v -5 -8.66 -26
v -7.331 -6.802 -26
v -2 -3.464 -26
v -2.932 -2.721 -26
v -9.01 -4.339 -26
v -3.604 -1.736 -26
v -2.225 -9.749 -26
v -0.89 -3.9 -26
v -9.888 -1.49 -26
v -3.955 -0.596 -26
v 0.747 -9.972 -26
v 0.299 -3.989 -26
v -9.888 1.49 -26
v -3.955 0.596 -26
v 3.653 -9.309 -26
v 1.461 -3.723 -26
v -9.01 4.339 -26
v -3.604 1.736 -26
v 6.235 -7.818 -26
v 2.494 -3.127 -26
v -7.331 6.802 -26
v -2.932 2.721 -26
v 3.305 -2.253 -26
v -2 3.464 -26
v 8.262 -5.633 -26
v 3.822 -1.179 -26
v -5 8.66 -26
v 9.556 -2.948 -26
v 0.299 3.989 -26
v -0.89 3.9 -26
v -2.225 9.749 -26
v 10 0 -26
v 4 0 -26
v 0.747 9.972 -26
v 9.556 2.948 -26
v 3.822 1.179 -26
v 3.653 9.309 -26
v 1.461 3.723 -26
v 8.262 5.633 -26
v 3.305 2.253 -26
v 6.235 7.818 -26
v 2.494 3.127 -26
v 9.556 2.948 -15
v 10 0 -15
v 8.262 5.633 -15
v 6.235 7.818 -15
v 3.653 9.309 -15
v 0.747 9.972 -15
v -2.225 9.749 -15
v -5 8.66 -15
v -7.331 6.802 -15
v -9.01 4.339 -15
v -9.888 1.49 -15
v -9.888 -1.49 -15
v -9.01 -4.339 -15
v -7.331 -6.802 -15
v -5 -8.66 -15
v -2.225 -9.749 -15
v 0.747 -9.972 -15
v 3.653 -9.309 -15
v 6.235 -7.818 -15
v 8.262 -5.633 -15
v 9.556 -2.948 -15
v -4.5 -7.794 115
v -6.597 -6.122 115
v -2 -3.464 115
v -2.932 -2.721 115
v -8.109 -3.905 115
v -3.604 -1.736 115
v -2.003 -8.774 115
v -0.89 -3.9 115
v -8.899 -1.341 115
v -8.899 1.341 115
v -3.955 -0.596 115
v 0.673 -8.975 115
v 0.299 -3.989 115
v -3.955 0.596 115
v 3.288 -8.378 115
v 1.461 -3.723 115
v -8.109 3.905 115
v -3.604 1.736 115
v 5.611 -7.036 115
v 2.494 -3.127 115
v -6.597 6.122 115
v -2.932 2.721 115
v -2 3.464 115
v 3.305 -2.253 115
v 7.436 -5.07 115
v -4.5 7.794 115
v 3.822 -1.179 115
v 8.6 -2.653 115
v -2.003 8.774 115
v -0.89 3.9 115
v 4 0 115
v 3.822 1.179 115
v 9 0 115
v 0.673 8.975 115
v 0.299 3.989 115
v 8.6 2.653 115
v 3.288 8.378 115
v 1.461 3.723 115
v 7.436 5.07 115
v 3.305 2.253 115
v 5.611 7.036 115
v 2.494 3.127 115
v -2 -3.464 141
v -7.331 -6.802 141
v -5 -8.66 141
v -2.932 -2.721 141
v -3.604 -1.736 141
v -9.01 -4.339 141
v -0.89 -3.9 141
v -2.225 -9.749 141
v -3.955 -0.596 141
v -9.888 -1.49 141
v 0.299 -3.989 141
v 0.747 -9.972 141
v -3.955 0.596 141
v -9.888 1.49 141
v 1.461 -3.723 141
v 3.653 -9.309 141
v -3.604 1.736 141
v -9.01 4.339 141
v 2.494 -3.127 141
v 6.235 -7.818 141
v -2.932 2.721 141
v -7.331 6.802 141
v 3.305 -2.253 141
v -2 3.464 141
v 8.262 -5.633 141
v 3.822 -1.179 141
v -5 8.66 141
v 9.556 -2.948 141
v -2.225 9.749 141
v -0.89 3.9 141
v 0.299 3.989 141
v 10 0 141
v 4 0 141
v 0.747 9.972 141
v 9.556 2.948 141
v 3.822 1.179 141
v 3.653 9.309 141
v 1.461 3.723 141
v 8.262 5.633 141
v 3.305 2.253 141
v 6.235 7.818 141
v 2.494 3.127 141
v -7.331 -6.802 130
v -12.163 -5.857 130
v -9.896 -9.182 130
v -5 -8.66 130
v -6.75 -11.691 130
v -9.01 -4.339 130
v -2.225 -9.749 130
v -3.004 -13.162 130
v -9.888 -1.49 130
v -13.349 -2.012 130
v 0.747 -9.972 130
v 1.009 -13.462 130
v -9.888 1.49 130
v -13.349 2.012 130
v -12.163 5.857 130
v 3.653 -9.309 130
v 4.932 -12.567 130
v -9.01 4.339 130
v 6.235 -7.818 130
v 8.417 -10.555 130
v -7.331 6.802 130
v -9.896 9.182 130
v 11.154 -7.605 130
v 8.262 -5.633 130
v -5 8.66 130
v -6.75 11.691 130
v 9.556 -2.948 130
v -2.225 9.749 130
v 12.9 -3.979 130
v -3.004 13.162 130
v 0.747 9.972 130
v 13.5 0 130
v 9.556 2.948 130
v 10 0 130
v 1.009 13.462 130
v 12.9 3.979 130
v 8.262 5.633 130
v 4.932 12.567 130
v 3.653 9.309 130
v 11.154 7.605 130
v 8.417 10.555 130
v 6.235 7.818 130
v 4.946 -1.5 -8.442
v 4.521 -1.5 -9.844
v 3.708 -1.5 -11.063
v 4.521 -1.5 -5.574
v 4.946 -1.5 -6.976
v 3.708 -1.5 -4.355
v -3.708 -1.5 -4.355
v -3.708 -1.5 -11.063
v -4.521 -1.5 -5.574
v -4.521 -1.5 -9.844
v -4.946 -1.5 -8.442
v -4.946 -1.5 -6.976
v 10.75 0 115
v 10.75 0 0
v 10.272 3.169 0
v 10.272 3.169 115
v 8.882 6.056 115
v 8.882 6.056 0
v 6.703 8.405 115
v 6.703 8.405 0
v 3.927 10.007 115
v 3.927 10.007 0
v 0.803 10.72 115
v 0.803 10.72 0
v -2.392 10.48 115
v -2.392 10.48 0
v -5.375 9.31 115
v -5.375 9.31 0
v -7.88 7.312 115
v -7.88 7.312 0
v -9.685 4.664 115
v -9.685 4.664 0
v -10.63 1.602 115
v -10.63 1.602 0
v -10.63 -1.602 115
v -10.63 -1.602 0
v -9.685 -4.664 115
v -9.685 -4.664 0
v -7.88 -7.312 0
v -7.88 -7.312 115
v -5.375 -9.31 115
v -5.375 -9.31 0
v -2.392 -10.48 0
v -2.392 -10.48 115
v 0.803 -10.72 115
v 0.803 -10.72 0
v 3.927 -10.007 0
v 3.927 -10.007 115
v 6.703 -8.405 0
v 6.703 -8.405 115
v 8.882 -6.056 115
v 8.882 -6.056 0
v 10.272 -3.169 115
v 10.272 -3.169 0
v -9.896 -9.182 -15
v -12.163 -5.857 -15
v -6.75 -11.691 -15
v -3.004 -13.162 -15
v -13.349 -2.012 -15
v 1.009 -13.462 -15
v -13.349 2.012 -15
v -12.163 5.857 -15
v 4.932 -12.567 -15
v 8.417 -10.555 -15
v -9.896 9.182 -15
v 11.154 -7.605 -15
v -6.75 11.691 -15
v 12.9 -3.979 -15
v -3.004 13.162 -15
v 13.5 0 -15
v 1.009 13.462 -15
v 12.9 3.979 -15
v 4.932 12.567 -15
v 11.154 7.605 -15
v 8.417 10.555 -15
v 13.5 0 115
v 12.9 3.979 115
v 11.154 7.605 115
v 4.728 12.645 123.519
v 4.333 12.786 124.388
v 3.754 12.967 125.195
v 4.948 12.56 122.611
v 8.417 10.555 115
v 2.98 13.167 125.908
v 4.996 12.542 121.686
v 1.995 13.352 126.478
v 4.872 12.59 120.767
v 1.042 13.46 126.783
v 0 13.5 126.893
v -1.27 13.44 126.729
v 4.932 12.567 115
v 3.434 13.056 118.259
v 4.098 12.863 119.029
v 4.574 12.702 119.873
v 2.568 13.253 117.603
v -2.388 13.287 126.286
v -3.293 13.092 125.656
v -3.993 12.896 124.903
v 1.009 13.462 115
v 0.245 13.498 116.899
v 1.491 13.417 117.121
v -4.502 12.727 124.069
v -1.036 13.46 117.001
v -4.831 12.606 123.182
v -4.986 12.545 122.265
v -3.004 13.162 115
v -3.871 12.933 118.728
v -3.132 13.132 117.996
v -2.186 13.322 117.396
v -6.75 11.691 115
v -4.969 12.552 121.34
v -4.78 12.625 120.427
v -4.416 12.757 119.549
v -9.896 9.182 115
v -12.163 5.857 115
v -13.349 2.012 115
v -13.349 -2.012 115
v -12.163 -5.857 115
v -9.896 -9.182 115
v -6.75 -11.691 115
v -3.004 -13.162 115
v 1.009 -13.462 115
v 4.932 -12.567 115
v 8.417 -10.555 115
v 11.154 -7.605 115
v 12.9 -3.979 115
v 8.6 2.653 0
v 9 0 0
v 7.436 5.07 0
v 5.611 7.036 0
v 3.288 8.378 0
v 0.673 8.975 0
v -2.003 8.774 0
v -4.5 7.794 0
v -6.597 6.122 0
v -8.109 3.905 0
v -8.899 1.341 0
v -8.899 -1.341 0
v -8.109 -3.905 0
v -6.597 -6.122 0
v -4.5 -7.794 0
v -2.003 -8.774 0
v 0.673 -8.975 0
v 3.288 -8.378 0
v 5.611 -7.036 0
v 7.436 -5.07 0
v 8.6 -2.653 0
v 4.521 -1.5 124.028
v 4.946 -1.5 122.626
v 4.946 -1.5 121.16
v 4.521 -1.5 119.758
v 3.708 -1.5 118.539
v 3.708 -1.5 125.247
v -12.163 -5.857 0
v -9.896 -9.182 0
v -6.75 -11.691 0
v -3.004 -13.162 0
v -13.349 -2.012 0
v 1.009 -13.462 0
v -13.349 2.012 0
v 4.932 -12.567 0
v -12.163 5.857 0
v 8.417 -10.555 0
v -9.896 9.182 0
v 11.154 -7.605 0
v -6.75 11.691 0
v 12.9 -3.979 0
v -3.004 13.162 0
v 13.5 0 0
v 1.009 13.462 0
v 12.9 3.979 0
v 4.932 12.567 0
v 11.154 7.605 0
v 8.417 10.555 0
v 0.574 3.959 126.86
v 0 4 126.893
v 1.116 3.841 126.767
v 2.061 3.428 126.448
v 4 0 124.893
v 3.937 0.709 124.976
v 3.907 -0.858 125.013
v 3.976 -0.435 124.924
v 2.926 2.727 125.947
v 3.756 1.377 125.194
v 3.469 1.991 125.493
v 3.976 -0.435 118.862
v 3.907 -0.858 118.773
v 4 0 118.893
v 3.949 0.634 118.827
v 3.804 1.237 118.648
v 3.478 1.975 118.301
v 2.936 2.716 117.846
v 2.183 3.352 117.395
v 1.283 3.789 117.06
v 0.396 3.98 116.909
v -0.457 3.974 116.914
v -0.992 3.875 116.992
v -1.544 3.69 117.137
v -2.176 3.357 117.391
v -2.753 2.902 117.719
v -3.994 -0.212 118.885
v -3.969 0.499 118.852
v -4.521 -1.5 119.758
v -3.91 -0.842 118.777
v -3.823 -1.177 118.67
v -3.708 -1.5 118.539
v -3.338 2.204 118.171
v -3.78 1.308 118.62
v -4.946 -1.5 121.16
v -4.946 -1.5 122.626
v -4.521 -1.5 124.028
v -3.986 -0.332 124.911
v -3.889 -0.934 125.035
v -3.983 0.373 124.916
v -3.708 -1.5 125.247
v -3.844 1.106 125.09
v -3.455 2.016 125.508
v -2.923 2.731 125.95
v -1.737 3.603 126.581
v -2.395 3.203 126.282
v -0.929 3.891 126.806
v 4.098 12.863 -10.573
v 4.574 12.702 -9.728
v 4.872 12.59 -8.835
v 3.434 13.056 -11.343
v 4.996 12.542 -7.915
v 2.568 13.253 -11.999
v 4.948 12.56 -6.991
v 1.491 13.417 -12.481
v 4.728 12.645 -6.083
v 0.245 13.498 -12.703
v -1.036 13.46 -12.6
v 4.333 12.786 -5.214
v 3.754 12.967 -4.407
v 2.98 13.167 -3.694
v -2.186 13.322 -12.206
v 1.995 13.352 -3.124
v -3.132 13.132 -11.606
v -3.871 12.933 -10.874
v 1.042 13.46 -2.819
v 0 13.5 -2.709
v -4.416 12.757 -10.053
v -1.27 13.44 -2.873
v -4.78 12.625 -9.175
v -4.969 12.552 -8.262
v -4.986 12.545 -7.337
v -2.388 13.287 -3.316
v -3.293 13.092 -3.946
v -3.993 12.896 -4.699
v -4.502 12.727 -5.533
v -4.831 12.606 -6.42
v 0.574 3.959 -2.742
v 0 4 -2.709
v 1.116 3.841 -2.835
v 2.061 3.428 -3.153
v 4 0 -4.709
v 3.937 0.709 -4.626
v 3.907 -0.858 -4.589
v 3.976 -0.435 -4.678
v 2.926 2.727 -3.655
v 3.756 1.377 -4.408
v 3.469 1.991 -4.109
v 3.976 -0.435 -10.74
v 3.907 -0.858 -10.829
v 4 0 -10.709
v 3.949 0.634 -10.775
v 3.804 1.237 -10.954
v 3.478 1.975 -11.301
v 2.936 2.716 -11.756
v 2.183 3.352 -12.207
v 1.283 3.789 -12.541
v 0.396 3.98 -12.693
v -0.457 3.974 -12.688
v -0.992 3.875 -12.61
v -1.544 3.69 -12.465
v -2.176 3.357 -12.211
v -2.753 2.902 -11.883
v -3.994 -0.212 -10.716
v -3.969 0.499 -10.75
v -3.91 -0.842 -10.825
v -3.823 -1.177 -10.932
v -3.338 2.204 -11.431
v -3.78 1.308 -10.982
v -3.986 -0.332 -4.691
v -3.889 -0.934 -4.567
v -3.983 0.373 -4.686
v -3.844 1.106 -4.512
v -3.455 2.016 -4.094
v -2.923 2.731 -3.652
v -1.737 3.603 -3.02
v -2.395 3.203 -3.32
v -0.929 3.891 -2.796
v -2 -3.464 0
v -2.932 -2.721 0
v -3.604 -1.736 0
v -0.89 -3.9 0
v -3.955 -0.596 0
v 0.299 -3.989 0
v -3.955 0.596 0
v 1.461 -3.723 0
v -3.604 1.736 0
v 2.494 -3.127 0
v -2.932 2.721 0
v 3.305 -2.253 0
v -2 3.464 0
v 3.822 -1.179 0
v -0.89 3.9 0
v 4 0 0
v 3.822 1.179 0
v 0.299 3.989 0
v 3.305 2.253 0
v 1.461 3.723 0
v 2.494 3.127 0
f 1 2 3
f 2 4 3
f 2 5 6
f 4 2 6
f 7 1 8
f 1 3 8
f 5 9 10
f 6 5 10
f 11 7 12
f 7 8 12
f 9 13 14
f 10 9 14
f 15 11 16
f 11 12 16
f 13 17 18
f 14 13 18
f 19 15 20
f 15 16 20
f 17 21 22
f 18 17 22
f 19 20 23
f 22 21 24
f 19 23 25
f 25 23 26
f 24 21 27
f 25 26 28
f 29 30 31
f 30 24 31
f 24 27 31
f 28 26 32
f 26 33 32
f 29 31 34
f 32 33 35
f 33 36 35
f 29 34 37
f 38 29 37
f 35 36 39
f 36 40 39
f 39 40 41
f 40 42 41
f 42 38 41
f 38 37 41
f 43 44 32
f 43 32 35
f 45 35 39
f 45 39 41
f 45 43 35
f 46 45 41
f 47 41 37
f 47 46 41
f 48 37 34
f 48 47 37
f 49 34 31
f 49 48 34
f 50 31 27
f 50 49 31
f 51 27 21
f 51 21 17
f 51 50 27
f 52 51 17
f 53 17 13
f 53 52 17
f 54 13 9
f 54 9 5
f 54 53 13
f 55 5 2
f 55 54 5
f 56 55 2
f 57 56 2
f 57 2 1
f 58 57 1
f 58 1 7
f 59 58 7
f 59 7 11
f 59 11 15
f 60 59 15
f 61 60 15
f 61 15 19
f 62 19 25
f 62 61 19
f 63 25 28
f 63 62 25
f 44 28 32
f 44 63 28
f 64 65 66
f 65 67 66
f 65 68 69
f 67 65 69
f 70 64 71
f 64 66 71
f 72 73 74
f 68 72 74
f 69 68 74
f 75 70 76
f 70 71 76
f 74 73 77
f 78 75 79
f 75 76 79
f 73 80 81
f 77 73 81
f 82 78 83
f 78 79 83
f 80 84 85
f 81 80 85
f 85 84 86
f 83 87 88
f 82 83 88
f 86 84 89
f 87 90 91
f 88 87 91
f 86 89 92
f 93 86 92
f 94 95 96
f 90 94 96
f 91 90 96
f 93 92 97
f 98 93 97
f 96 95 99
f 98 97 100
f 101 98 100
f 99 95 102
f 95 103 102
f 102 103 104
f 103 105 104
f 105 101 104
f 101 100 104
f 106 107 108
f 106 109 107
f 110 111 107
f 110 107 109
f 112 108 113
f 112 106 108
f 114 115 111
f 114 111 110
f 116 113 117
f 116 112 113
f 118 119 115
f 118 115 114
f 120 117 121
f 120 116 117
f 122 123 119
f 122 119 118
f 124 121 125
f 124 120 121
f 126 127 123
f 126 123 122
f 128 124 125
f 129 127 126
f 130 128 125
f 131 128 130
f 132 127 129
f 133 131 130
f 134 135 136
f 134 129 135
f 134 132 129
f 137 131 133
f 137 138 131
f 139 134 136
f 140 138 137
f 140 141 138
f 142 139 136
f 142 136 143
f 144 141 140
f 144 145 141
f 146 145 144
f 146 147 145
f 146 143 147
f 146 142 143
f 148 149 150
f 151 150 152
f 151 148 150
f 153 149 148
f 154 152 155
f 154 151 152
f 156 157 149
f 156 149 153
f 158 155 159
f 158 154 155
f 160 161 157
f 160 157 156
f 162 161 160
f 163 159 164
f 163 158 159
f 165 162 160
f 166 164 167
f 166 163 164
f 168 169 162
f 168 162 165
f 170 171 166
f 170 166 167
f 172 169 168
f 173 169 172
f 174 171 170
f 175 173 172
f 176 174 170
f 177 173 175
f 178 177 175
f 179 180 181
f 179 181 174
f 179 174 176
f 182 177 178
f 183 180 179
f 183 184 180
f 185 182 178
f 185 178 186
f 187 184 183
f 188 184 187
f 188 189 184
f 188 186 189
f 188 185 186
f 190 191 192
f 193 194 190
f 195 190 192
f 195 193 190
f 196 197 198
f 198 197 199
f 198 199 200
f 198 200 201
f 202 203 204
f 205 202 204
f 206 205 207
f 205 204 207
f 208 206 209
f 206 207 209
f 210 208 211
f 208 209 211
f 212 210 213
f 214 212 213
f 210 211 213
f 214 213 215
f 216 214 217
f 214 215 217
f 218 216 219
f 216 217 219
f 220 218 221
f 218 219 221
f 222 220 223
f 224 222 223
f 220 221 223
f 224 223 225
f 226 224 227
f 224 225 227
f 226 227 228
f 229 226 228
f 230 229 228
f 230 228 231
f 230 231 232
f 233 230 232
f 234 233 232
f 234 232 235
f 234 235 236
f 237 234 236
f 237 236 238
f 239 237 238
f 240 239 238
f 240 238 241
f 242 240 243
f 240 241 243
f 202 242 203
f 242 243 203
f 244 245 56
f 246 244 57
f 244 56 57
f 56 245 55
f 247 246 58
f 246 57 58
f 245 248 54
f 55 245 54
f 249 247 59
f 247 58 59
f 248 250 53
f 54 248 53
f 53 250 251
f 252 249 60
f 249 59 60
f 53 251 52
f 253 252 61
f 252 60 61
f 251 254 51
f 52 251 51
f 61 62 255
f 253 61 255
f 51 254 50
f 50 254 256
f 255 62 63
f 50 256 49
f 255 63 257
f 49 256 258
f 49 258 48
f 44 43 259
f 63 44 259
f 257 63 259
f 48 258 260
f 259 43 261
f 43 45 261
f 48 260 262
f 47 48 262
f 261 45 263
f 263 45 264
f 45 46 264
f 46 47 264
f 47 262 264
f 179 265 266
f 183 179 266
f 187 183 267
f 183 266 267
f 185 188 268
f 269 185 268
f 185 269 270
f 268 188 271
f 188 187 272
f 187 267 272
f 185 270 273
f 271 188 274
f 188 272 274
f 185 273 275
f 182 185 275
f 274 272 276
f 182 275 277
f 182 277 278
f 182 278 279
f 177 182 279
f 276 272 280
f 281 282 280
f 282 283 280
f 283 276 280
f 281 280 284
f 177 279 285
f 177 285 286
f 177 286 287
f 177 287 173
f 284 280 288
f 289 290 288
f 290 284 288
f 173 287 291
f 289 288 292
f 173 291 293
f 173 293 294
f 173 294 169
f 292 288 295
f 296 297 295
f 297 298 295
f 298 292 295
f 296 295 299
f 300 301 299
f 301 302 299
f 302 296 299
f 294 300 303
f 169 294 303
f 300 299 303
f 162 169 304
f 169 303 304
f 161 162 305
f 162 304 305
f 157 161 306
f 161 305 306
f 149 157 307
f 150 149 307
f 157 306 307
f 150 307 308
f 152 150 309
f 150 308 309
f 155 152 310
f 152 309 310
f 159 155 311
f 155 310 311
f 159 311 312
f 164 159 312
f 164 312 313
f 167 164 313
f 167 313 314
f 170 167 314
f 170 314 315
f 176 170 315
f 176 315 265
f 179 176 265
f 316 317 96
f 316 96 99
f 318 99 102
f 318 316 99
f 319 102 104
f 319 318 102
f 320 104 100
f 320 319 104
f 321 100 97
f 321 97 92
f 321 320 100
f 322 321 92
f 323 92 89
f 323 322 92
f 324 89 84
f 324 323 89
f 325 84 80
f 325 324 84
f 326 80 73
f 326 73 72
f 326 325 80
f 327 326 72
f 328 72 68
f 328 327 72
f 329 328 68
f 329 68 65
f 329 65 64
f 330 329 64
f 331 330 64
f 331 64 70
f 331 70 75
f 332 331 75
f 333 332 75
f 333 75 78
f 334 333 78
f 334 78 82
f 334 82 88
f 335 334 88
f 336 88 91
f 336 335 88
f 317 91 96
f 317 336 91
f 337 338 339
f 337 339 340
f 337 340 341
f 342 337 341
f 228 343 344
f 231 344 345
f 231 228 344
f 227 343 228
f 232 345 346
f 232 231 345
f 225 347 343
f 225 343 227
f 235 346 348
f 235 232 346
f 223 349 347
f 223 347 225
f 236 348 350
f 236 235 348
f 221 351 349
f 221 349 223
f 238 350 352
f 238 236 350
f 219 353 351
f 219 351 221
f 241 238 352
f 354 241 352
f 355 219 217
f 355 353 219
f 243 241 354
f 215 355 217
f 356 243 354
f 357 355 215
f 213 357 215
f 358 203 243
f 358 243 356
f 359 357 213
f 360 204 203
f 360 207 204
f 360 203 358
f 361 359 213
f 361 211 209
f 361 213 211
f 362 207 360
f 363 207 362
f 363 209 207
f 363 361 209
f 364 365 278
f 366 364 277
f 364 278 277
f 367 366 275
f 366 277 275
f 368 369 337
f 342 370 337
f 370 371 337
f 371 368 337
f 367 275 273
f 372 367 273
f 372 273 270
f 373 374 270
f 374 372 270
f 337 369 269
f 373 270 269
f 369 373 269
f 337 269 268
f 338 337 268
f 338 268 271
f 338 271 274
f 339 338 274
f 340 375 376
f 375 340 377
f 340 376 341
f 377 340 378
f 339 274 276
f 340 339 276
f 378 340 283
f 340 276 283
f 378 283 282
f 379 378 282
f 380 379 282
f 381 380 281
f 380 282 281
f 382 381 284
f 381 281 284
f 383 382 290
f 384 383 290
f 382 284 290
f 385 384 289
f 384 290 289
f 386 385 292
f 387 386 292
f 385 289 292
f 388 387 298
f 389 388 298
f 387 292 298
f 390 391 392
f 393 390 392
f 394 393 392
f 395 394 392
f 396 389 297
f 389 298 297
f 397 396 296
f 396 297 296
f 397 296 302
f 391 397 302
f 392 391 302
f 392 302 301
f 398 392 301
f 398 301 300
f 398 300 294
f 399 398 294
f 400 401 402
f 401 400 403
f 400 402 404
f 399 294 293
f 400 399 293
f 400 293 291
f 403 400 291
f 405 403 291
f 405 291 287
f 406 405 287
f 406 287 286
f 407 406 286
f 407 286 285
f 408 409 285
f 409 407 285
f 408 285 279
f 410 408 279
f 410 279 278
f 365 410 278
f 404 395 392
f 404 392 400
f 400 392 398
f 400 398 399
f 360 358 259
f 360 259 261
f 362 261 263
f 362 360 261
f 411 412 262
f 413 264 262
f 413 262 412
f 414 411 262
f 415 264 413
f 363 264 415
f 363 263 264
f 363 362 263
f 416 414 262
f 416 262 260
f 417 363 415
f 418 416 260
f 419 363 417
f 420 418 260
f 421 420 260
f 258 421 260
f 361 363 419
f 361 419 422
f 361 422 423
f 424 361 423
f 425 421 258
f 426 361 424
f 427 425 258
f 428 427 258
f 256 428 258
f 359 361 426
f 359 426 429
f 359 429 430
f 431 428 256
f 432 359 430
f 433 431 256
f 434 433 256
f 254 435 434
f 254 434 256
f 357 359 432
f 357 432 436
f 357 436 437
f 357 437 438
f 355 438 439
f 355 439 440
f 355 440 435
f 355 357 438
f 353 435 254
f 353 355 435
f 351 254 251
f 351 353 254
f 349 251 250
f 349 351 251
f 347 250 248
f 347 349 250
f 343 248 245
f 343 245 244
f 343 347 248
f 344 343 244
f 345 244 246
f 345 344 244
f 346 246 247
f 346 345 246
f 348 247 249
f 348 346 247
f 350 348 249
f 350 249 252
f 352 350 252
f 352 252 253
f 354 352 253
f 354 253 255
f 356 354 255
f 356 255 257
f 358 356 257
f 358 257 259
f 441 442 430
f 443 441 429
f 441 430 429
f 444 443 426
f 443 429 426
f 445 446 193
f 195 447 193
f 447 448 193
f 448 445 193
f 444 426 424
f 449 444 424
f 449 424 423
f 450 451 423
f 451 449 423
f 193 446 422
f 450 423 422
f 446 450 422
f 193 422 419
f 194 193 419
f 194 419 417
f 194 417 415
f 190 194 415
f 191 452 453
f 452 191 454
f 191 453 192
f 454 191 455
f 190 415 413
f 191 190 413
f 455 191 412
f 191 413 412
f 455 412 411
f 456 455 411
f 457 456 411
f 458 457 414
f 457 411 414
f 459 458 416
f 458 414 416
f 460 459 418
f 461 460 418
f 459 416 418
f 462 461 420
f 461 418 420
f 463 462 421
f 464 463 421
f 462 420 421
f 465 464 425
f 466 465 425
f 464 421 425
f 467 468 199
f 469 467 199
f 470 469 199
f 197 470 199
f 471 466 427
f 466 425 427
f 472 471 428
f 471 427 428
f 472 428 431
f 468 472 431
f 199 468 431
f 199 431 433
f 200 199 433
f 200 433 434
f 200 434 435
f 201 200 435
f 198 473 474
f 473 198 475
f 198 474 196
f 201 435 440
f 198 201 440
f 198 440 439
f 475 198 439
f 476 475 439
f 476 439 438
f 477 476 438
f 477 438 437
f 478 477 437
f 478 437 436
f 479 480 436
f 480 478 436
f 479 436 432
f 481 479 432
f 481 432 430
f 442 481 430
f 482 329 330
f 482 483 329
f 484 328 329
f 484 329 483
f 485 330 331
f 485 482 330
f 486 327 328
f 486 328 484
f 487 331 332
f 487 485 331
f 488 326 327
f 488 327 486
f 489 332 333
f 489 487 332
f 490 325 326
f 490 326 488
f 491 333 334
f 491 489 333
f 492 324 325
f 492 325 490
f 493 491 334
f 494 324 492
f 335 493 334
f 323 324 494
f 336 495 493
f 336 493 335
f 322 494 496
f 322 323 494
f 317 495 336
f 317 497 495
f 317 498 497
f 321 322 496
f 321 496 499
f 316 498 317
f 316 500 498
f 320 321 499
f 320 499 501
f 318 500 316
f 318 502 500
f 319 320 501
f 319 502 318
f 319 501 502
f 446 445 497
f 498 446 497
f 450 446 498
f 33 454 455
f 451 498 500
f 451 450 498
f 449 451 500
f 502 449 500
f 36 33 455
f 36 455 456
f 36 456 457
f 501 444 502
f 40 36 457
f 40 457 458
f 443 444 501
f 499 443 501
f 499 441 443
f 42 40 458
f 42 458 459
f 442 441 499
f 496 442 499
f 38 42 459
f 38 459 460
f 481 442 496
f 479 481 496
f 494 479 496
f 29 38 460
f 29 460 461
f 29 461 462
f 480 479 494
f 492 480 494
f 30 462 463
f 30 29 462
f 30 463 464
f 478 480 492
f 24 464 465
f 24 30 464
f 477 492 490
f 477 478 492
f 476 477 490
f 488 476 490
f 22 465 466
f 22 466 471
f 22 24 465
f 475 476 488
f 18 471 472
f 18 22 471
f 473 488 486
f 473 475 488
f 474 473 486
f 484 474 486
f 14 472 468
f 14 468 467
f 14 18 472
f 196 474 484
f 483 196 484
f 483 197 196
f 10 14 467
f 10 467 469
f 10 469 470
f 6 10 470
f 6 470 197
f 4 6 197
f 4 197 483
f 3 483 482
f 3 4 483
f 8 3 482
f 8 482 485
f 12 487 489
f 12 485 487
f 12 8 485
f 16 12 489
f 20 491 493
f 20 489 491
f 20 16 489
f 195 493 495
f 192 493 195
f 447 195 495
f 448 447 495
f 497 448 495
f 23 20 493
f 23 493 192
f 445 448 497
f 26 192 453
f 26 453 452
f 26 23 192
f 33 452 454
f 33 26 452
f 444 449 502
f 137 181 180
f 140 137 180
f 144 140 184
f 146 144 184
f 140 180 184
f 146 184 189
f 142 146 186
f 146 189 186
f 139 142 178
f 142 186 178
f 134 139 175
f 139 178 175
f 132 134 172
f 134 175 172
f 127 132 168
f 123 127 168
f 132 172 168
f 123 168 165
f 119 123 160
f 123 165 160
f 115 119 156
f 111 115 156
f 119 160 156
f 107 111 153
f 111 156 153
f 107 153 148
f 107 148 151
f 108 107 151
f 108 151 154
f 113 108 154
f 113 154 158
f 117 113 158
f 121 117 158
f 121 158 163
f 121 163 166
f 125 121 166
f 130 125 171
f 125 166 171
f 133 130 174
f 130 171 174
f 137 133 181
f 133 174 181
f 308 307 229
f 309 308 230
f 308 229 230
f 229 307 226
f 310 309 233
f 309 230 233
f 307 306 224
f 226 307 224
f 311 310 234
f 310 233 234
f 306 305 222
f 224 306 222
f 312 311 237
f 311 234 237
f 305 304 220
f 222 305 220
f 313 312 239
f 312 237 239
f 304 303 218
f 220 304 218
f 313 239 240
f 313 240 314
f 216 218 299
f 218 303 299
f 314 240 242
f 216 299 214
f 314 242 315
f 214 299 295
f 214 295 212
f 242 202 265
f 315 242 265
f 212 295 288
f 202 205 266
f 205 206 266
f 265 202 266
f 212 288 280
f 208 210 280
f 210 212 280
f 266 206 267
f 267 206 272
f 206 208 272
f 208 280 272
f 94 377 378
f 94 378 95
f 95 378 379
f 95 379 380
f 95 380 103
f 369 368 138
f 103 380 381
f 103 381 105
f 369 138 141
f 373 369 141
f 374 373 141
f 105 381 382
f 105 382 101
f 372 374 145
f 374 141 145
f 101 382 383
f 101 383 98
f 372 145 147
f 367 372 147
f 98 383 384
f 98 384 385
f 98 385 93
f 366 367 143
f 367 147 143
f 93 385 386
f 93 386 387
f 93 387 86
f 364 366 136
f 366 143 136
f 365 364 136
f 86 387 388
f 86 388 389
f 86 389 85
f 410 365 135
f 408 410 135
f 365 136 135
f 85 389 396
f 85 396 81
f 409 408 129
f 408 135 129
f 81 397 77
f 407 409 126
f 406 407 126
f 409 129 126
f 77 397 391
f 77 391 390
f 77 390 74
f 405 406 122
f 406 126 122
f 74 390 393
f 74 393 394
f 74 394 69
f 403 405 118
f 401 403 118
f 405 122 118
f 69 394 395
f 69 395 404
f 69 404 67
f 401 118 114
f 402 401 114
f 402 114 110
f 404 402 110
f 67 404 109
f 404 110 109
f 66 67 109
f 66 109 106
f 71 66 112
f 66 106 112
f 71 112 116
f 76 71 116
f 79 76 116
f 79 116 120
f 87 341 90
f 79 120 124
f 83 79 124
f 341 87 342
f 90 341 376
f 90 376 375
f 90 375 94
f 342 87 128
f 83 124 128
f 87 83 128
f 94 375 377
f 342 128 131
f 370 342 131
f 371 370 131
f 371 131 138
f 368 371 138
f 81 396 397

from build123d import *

# Parameters (mm, degrees)
SKETCH_1_R          = 10.75
SKETCH_1_R_2        = 9
EXTRUDE_1_DEPTH     = 115
SKETCH_2_R          = 13.5
EXTRUDE_2_DEPTH     = 15
SKETCH_3_R          = 10
EXTRUDE_3_DEPTH     = 11
SKETCH_4_R          = 4
CUT_EXTRUDE_4_DEPTH = 143.286682441
SKETCH_5_R          = 5
CUT_EXTRUDE_5_DEPTH = 15


with BuildPart() as part:
    # 草图1 → 拉伸1 (new body)
    with BuildSketch(Plane.XY):
        Circle(SKETCH_1_R)
        Circle(SKETCH_1_R_2, mode=Mode.SUBTRACT)
    extrude(amount=EXTRUDE_1_DEPTH)

    # 草图2 → 拉伸2 (add)
    with BuildSketch(Plane.XY.offset(115)):
        Circle(SKETCH_2_R)
    extrude_2 = extrude(amount=EXTRUDE_2_DEPTH)

    # 草图3 → 拉伸3 (add)
    with BuildSketch(Plane.XY.offset(130)):
        Circle(SKETCH_3_R)
    extrude_3 = extrude(amount=EXTRUDE_3_DEPTH)

    # 草图4 → 拉伸4 (cut, through all)
    with BuildSketch(Plane.XY.offset(141)):
        Circle(SKETCH_4_R)
    cut_extrude_4 = extrude(amount=-CUT_EXTRUDE_4_DEPTH, mode=Mode.SUBTRACT)

    # 镜向2: 拉伸2, 拉伸3, 拉伸4 across plane
    add(extrude_2.mirror(Plane(origin=(0, 0, 57.5), x_dir=(1, 0, 0), z_dir=(0, 0, -1))))
    add(extrude_3.mirror(Plane(origin=(0, 0, 57.5), x_dir=(1, 0, 0), z_dir=(0, 0, -1))))
    add(cut_extrude_4.mirror(Plane(origin=(0, 0, 57.5), x_dir=(1, 0, 0), z_dir=(0, 0, -1))), mode=Mode.SUBTRACT)

    # 草图5 → 拉伸5 (cut)
    with BuildSketch(Plane(origin=(0, 13.5, 0), x_dir=(-1, 0, 0), z_dir=(0, 1, 0))):
        with Locations(Location((0, 121.892959872, 0), (0, 0, 90))):
            Circle(SKETCH_5_R)
        with Locations(Location((0, -7.708924082, 0), (0, 0, 90))):
            Circle(SKETCH_5_R)
    extrude(amount=-CUT_EXTRUDE_5_DEPTH, mode=Mode.SUBTRACT)


solid = part.part
